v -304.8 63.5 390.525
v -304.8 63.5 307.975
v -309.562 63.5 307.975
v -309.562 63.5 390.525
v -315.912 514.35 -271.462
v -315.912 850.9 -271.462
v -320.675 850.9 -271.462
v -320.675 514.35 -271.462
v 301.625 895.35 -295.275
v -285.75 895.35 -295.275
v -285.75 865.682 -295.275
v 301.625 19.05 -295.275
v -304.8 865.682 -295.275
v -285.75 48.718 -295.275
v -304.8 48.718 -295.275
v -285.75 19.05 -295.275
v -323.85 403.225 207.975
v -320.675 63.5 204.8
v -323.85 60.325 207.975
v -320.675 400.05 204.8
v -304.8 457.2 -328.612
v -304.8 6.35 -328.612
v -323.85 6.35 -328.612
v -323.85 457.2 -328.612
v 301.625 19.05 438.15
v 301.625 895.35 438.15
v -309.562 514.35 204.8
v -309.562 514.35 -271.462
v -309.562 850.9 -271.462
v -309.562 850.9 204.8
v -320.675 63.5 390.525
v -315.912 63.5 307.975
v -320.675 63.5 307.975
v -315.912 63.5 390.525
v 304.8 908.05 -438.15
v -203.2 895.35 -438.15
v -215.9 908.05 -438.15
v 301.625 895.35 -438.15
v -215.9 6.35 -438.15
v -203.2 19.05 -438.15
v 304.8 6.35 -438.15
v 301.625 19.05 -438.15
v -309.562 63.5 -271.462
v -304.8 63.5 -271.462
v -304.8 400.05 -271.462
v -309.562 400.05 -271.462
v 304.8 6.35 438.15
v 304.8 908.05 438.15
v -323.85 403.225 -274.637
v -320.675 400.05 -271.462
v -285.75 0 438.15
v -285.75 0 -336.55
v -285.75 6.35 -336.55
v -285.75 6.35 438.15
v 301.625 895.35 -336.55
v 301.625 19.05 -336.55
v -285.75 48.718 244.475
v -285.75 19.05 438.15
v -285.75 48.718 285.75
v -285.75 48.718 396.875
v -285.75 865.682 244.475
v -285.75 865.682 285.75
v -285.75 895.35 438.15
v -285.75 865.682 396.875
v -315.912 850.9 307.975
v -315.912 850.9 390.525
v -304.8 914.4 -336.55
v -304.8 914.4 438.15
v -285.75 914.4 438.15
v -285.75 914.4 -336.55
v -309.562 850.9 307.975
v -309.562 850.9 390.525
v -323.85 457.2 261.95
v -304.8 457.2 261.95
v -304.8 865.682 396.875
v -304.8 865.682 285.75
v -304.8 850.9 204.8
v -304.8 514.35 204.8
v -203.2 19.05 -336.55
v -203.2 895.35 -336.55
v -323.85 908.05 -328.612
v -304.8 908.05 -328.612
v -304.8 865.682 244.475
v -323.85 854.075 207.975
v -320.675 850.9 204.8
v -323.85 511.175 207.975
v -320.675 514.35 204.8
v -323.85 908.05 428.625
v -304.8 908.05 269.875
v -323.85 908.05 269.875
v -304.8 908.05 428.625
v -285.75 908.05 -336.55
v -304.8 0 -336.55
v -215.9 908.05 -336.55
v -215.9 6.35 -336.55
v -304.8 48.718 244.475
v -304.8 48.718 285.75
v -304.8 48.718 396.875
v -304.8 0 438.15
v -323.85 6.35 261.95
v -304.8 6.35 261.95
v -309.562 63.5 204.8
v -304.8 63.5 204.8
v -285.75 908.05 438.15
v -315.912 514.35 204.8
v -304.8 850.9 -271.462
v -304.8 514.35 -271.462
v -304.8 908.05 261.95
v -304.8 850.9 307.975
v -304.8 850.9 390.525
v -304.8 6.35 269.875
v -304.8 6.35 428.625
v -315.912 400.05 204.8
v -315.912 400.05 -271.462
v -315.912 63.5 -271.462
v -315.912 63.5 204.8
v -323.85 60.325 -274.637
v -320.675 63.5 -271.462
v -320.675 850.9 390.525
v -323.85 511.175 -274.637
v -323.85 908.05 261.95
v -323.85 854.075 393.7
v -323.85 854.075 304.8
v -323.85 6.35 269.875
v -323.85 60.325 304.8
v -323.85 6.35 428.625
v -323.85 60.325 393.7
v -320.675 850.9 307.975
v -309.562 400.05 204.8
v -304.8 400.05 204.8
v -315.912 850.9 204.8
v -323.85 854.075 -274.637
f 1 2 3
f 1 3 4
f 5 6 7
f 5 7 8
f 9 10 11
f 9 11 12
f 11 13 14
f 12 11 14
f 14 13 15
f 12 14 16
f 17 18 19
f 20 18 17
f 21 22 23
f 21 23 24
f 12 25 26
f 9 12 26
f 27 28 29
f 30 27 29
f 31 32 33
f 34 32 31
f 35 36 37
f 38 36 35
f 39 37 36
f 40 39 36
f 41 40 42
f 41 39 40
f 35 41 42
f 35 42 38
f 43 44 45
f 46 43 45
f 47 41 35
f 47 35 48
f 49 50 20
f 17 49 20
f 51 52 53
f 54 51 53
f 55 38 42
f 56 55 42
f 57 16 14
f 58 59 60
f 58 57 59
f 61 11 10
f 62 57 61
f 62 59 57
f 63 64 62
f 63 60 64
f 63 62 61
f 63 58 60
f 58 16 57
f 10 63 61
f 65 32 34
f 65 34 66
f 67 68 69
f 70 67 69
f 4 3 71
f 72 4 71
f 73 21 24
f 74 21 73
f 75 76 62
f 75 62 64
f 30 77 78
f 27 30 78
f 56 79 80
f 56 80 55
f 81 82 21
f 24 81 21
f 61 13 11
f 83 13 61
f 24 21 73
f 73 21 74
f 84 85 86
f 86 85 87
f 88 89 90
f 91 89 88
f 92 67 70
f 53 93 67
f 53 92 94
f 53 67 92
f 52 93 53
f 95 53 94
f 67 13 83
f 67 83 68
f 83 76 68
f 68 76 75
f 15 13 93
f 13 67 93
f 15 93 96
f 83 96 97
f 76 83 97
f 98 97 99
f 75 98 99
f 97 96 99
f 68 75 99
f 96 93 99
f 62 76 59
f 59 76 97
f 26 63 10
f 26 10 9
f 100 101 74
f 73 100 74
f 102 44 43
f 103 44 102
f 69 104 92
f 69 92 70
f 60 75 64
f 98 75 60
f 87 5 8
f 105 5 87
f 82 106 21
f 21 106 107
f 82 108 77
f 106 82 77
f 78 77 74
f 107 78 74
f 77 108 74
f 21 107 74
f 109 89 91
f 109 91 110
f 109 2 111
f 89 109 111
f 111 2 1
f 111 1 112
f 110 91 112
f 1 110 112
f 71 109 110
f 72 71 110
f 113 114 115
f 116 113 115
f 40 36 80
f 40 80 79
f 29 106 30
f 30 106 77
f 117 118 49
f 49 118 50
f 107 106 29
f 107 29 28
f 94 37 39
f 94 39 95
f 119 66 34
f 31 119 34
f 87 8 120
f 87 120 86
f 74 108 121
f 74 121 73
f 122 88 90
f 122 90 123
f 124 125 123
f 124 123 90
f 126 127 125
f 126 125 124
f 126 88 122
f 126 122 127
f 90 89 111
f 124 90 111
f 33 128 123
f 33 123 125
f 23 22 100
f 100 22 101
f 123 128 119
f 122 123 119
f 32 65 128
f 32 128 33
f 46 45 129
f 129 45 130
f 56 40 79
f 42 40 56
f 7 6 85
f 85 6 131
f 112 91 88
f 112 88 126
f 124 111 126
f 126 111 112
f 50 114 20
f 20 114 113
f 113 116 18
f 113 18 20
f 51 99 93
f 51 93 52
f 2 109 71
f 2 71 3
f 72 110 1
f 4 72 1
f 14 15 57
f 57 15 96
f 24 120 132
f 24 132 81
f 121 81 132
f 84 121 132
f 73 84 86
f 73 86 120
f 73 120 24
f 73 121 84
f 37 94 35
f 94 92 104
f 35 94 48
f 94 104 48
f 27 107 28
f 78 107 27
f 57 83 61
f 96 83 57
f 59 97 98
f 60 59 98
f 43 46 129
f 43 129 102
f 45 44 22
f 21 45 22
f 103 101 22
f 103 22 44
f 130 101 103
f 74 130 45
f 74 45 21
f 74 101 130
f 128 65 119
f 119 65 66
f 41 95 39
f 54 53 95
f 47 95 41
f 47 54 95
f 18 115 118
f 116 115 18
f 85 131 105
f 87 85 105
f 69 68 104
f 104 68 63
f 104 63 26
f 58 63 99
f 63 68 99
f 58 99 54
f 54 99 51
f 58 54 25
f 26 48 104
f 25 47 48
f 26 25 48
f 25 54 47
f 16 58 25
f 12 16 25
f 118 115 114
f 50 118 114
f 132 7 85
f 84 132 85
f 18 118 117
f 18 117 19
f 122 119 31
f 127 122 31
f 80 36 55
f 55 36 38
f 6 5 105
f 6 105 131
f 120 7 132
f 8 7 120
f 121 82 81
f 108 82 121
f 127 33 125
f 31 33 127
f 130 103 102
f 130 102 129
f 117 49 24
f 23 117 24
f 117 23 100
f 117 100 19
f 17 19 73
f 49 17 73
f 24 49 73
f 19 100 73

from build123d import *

# Parameters (mm, degrees)
F0_W      = 609.6
F0_H      = 876.3
F1_DEPTH  = 914.4
F2_W      = 88.9
F2_H      = 101.6
F3_DEPTH  = 914.401
F4_W      = 816.963934
F4_H      = 692.15
F5_DEPTH  = 19.05
F6_W      = 590.55
F6_H      = 6.35
F7_DEPTH  = 876.301
F8_W      = 587.375
F8_H      = 876.3
F9_DEPTH  = 733.425
F10_W     = 816.963934
F10_H     = 41.275
F11_DEPTH = 19.05
F12_W     = 450.85
F12_H     = 590.5627
F12_W_2   = 336.55
F12_H_2   = 476.2627
F13_DEPTH = 19.05
F14_W     = 6.35
F14_H     = 336.55
F15_DEPTH = 476.2627
F16_SIZE  = 3.175
F17_W     = 901.7
F17_H     = 158.75
F17_W_2   = 787.4
F17_H_2   = 82.55
F18_DEPTH = 19.05
F19_W     = 6.35
F19_H     = 787.4
F20_DEPTH = 82.55
F21_SIZE  = 3.175
F22_W     = 504.825
F22_H     = 876.3
F23_DEPTH = 101.6


with BuildPart() as f1:
    # F0 (on Front) → F1 (new body)
    with BuildSketch(Plane.XZ):
        Rectangle(F0_W, F0_H)
    extrude(amount=-F1_DEPTH)

    # F2 (on face) → F3 (cut, through all)
    with BuildSketch(Plane.XZ):
        with Locations((-260.35, -387.35)):
            Rectangle(F2_W, F2_H)
    extrude(amount=-F3_DEPTH, mode=Mode.SUBTRACT)

    # F4 (on face) → F5 (cut)
    with BuildSketch(Plane(origin=(-304.8, 0, 0), x_dir=(0, -1, 0), z_dir=(-1, 0, 0))):
        with Locations((-457.2, 50.8)):
            Rectangle(F4_W, F4_H)
    extrude(amount=-F5_DEPTH, mode=Mode.SUBTRACT)

    # F6 (on face) → F7 (cut, through all)
    with BuildSketch(Plane.XY.offset(438.15)):
        with Locations((9.525, 911.225)):
            Rectangle(F6_W, F6_H)
        with Locations((9.525, 3.175)):
            Rectangle(F6_W, F6_H)
    extrude(amount=-F7_DEPTH, mode=Mode.SUBTRACT)

    # F8 (on face) → F9 (cut, through all)
    with BuildSketch(Plane.XY.offset(438.15)):
        with Locations((7.9375, 457.2)):
            Rectangle(F8_W, F8_H)
    extrude(amount=-F9_DEPTH, mode=Mode.SUBTRACT)

    # F10 (on face) → F11 (join, through all)
    with BuildSketch(Plane(origin=(-304.8, 0, 0), x_dir=(0, -1, 0), z_dir=(-1, 0, 0))):
        with Locations((-457.2, 265.1125)):
            Rectangle(F10_W, F10_H)
    extrude(amount=-F11_DEPTH)

    # F22 (on face) → F23 (cut)
    with BuildSketch(Plane(origin=(0, 0, -438.15), x_dir=(1, 0, 0), z_dir=(0, 0, -1))):
        with Locations((49.2125, -457.2)):
            Rectangle(F22_W, F22_H)
    extrude(amount=-F23_DEPTH, mode=Mode.SUBTRACT)


with BuildPart() as f13:
    # F12 (on face) → F13 (new body)
    with BuildSketch(Plane(origin=(-304.8, 0, 0), x_dir=(0, -1, 0), z_dir=(-1, 0, 0))):
        with Locations((-682.625, -33.33115)):
            Rectangle(F12_W, F12_H)
        with Locations((-682.625, -33.33115)):
            Rectangle(F12_W_2, F12_H_2, mode=Mode.SUBTRACT)
    extrude(amount=F13_DEPTH)

    # F14 (on face) → F15 (join, through all)
    with BuildSketch(Plane.XY.offset(-271.4625)):
        with Locations((-312.7375, 682.625)):
            Rectangle(F14_W, F14_H)
    extrude(amount=F15_DEPTH)

    # F16
    f16_edges = [f13.edges().sort_by_distance(p)[0] for p in [
        (-323.85, 850.9, -33.33115),
        (-323.85, 682.625, -271.4625),
        (-323.85, 514.35, -33.33115),
        (-323.85, 682.625, 204.8002),
    ]]
    chamfer(f16_edges, length=F16_SIZE)


with BuildPart() as f18:
    # F17 (on face) → F18 (new body)
    with BuildSketch(Plane(origin=(-304.8, 0, 0), x_dir=(0, -1, 0), z_dir=(-1, 0, 0))):
        with Locations((-457.2, 349.25)):
            Rectangle(F17_W, F17_H)
        with Locations((-457.2, 349.25)):
            Rectangle(F17_W_2, F17_H_2, mode=Mode.SUBTRACT)
    extrude(amount=F18_DEPTH)

    # F19 (on face) → F20 (join, through all)
    with BuildSketch(Plane.XY.offset(307.975)):
        with Locations((-312.7375, 457.2)):
            Rectangle(F19_W, F19_H)
    extrude(amount=F20_DEPTH)

    # F21
    f21_edges = [f18.edges().sort_by_distance(p)[0] for p in [
        (-323.85, 457.2, 307.975),
        (-323.85, 850.9, 349.25),
        (-323.85, 457.2, 390.525),
        (-323.85, 63.5, 349.25),
    ]]
    chamfer(f21_edges, length=F21_SIZE)


with BuildPart() as f24_1:
    # F24: instance of F13
    add(f13.part.mirror(Plane(origin=(-314.325, 457.2, -33.33115), x_dir=(1, 0, 0), z_dir=(0, -1, 0))))


solid = Compound([f1.part, f13.part, f18.part, f24_1.part])
